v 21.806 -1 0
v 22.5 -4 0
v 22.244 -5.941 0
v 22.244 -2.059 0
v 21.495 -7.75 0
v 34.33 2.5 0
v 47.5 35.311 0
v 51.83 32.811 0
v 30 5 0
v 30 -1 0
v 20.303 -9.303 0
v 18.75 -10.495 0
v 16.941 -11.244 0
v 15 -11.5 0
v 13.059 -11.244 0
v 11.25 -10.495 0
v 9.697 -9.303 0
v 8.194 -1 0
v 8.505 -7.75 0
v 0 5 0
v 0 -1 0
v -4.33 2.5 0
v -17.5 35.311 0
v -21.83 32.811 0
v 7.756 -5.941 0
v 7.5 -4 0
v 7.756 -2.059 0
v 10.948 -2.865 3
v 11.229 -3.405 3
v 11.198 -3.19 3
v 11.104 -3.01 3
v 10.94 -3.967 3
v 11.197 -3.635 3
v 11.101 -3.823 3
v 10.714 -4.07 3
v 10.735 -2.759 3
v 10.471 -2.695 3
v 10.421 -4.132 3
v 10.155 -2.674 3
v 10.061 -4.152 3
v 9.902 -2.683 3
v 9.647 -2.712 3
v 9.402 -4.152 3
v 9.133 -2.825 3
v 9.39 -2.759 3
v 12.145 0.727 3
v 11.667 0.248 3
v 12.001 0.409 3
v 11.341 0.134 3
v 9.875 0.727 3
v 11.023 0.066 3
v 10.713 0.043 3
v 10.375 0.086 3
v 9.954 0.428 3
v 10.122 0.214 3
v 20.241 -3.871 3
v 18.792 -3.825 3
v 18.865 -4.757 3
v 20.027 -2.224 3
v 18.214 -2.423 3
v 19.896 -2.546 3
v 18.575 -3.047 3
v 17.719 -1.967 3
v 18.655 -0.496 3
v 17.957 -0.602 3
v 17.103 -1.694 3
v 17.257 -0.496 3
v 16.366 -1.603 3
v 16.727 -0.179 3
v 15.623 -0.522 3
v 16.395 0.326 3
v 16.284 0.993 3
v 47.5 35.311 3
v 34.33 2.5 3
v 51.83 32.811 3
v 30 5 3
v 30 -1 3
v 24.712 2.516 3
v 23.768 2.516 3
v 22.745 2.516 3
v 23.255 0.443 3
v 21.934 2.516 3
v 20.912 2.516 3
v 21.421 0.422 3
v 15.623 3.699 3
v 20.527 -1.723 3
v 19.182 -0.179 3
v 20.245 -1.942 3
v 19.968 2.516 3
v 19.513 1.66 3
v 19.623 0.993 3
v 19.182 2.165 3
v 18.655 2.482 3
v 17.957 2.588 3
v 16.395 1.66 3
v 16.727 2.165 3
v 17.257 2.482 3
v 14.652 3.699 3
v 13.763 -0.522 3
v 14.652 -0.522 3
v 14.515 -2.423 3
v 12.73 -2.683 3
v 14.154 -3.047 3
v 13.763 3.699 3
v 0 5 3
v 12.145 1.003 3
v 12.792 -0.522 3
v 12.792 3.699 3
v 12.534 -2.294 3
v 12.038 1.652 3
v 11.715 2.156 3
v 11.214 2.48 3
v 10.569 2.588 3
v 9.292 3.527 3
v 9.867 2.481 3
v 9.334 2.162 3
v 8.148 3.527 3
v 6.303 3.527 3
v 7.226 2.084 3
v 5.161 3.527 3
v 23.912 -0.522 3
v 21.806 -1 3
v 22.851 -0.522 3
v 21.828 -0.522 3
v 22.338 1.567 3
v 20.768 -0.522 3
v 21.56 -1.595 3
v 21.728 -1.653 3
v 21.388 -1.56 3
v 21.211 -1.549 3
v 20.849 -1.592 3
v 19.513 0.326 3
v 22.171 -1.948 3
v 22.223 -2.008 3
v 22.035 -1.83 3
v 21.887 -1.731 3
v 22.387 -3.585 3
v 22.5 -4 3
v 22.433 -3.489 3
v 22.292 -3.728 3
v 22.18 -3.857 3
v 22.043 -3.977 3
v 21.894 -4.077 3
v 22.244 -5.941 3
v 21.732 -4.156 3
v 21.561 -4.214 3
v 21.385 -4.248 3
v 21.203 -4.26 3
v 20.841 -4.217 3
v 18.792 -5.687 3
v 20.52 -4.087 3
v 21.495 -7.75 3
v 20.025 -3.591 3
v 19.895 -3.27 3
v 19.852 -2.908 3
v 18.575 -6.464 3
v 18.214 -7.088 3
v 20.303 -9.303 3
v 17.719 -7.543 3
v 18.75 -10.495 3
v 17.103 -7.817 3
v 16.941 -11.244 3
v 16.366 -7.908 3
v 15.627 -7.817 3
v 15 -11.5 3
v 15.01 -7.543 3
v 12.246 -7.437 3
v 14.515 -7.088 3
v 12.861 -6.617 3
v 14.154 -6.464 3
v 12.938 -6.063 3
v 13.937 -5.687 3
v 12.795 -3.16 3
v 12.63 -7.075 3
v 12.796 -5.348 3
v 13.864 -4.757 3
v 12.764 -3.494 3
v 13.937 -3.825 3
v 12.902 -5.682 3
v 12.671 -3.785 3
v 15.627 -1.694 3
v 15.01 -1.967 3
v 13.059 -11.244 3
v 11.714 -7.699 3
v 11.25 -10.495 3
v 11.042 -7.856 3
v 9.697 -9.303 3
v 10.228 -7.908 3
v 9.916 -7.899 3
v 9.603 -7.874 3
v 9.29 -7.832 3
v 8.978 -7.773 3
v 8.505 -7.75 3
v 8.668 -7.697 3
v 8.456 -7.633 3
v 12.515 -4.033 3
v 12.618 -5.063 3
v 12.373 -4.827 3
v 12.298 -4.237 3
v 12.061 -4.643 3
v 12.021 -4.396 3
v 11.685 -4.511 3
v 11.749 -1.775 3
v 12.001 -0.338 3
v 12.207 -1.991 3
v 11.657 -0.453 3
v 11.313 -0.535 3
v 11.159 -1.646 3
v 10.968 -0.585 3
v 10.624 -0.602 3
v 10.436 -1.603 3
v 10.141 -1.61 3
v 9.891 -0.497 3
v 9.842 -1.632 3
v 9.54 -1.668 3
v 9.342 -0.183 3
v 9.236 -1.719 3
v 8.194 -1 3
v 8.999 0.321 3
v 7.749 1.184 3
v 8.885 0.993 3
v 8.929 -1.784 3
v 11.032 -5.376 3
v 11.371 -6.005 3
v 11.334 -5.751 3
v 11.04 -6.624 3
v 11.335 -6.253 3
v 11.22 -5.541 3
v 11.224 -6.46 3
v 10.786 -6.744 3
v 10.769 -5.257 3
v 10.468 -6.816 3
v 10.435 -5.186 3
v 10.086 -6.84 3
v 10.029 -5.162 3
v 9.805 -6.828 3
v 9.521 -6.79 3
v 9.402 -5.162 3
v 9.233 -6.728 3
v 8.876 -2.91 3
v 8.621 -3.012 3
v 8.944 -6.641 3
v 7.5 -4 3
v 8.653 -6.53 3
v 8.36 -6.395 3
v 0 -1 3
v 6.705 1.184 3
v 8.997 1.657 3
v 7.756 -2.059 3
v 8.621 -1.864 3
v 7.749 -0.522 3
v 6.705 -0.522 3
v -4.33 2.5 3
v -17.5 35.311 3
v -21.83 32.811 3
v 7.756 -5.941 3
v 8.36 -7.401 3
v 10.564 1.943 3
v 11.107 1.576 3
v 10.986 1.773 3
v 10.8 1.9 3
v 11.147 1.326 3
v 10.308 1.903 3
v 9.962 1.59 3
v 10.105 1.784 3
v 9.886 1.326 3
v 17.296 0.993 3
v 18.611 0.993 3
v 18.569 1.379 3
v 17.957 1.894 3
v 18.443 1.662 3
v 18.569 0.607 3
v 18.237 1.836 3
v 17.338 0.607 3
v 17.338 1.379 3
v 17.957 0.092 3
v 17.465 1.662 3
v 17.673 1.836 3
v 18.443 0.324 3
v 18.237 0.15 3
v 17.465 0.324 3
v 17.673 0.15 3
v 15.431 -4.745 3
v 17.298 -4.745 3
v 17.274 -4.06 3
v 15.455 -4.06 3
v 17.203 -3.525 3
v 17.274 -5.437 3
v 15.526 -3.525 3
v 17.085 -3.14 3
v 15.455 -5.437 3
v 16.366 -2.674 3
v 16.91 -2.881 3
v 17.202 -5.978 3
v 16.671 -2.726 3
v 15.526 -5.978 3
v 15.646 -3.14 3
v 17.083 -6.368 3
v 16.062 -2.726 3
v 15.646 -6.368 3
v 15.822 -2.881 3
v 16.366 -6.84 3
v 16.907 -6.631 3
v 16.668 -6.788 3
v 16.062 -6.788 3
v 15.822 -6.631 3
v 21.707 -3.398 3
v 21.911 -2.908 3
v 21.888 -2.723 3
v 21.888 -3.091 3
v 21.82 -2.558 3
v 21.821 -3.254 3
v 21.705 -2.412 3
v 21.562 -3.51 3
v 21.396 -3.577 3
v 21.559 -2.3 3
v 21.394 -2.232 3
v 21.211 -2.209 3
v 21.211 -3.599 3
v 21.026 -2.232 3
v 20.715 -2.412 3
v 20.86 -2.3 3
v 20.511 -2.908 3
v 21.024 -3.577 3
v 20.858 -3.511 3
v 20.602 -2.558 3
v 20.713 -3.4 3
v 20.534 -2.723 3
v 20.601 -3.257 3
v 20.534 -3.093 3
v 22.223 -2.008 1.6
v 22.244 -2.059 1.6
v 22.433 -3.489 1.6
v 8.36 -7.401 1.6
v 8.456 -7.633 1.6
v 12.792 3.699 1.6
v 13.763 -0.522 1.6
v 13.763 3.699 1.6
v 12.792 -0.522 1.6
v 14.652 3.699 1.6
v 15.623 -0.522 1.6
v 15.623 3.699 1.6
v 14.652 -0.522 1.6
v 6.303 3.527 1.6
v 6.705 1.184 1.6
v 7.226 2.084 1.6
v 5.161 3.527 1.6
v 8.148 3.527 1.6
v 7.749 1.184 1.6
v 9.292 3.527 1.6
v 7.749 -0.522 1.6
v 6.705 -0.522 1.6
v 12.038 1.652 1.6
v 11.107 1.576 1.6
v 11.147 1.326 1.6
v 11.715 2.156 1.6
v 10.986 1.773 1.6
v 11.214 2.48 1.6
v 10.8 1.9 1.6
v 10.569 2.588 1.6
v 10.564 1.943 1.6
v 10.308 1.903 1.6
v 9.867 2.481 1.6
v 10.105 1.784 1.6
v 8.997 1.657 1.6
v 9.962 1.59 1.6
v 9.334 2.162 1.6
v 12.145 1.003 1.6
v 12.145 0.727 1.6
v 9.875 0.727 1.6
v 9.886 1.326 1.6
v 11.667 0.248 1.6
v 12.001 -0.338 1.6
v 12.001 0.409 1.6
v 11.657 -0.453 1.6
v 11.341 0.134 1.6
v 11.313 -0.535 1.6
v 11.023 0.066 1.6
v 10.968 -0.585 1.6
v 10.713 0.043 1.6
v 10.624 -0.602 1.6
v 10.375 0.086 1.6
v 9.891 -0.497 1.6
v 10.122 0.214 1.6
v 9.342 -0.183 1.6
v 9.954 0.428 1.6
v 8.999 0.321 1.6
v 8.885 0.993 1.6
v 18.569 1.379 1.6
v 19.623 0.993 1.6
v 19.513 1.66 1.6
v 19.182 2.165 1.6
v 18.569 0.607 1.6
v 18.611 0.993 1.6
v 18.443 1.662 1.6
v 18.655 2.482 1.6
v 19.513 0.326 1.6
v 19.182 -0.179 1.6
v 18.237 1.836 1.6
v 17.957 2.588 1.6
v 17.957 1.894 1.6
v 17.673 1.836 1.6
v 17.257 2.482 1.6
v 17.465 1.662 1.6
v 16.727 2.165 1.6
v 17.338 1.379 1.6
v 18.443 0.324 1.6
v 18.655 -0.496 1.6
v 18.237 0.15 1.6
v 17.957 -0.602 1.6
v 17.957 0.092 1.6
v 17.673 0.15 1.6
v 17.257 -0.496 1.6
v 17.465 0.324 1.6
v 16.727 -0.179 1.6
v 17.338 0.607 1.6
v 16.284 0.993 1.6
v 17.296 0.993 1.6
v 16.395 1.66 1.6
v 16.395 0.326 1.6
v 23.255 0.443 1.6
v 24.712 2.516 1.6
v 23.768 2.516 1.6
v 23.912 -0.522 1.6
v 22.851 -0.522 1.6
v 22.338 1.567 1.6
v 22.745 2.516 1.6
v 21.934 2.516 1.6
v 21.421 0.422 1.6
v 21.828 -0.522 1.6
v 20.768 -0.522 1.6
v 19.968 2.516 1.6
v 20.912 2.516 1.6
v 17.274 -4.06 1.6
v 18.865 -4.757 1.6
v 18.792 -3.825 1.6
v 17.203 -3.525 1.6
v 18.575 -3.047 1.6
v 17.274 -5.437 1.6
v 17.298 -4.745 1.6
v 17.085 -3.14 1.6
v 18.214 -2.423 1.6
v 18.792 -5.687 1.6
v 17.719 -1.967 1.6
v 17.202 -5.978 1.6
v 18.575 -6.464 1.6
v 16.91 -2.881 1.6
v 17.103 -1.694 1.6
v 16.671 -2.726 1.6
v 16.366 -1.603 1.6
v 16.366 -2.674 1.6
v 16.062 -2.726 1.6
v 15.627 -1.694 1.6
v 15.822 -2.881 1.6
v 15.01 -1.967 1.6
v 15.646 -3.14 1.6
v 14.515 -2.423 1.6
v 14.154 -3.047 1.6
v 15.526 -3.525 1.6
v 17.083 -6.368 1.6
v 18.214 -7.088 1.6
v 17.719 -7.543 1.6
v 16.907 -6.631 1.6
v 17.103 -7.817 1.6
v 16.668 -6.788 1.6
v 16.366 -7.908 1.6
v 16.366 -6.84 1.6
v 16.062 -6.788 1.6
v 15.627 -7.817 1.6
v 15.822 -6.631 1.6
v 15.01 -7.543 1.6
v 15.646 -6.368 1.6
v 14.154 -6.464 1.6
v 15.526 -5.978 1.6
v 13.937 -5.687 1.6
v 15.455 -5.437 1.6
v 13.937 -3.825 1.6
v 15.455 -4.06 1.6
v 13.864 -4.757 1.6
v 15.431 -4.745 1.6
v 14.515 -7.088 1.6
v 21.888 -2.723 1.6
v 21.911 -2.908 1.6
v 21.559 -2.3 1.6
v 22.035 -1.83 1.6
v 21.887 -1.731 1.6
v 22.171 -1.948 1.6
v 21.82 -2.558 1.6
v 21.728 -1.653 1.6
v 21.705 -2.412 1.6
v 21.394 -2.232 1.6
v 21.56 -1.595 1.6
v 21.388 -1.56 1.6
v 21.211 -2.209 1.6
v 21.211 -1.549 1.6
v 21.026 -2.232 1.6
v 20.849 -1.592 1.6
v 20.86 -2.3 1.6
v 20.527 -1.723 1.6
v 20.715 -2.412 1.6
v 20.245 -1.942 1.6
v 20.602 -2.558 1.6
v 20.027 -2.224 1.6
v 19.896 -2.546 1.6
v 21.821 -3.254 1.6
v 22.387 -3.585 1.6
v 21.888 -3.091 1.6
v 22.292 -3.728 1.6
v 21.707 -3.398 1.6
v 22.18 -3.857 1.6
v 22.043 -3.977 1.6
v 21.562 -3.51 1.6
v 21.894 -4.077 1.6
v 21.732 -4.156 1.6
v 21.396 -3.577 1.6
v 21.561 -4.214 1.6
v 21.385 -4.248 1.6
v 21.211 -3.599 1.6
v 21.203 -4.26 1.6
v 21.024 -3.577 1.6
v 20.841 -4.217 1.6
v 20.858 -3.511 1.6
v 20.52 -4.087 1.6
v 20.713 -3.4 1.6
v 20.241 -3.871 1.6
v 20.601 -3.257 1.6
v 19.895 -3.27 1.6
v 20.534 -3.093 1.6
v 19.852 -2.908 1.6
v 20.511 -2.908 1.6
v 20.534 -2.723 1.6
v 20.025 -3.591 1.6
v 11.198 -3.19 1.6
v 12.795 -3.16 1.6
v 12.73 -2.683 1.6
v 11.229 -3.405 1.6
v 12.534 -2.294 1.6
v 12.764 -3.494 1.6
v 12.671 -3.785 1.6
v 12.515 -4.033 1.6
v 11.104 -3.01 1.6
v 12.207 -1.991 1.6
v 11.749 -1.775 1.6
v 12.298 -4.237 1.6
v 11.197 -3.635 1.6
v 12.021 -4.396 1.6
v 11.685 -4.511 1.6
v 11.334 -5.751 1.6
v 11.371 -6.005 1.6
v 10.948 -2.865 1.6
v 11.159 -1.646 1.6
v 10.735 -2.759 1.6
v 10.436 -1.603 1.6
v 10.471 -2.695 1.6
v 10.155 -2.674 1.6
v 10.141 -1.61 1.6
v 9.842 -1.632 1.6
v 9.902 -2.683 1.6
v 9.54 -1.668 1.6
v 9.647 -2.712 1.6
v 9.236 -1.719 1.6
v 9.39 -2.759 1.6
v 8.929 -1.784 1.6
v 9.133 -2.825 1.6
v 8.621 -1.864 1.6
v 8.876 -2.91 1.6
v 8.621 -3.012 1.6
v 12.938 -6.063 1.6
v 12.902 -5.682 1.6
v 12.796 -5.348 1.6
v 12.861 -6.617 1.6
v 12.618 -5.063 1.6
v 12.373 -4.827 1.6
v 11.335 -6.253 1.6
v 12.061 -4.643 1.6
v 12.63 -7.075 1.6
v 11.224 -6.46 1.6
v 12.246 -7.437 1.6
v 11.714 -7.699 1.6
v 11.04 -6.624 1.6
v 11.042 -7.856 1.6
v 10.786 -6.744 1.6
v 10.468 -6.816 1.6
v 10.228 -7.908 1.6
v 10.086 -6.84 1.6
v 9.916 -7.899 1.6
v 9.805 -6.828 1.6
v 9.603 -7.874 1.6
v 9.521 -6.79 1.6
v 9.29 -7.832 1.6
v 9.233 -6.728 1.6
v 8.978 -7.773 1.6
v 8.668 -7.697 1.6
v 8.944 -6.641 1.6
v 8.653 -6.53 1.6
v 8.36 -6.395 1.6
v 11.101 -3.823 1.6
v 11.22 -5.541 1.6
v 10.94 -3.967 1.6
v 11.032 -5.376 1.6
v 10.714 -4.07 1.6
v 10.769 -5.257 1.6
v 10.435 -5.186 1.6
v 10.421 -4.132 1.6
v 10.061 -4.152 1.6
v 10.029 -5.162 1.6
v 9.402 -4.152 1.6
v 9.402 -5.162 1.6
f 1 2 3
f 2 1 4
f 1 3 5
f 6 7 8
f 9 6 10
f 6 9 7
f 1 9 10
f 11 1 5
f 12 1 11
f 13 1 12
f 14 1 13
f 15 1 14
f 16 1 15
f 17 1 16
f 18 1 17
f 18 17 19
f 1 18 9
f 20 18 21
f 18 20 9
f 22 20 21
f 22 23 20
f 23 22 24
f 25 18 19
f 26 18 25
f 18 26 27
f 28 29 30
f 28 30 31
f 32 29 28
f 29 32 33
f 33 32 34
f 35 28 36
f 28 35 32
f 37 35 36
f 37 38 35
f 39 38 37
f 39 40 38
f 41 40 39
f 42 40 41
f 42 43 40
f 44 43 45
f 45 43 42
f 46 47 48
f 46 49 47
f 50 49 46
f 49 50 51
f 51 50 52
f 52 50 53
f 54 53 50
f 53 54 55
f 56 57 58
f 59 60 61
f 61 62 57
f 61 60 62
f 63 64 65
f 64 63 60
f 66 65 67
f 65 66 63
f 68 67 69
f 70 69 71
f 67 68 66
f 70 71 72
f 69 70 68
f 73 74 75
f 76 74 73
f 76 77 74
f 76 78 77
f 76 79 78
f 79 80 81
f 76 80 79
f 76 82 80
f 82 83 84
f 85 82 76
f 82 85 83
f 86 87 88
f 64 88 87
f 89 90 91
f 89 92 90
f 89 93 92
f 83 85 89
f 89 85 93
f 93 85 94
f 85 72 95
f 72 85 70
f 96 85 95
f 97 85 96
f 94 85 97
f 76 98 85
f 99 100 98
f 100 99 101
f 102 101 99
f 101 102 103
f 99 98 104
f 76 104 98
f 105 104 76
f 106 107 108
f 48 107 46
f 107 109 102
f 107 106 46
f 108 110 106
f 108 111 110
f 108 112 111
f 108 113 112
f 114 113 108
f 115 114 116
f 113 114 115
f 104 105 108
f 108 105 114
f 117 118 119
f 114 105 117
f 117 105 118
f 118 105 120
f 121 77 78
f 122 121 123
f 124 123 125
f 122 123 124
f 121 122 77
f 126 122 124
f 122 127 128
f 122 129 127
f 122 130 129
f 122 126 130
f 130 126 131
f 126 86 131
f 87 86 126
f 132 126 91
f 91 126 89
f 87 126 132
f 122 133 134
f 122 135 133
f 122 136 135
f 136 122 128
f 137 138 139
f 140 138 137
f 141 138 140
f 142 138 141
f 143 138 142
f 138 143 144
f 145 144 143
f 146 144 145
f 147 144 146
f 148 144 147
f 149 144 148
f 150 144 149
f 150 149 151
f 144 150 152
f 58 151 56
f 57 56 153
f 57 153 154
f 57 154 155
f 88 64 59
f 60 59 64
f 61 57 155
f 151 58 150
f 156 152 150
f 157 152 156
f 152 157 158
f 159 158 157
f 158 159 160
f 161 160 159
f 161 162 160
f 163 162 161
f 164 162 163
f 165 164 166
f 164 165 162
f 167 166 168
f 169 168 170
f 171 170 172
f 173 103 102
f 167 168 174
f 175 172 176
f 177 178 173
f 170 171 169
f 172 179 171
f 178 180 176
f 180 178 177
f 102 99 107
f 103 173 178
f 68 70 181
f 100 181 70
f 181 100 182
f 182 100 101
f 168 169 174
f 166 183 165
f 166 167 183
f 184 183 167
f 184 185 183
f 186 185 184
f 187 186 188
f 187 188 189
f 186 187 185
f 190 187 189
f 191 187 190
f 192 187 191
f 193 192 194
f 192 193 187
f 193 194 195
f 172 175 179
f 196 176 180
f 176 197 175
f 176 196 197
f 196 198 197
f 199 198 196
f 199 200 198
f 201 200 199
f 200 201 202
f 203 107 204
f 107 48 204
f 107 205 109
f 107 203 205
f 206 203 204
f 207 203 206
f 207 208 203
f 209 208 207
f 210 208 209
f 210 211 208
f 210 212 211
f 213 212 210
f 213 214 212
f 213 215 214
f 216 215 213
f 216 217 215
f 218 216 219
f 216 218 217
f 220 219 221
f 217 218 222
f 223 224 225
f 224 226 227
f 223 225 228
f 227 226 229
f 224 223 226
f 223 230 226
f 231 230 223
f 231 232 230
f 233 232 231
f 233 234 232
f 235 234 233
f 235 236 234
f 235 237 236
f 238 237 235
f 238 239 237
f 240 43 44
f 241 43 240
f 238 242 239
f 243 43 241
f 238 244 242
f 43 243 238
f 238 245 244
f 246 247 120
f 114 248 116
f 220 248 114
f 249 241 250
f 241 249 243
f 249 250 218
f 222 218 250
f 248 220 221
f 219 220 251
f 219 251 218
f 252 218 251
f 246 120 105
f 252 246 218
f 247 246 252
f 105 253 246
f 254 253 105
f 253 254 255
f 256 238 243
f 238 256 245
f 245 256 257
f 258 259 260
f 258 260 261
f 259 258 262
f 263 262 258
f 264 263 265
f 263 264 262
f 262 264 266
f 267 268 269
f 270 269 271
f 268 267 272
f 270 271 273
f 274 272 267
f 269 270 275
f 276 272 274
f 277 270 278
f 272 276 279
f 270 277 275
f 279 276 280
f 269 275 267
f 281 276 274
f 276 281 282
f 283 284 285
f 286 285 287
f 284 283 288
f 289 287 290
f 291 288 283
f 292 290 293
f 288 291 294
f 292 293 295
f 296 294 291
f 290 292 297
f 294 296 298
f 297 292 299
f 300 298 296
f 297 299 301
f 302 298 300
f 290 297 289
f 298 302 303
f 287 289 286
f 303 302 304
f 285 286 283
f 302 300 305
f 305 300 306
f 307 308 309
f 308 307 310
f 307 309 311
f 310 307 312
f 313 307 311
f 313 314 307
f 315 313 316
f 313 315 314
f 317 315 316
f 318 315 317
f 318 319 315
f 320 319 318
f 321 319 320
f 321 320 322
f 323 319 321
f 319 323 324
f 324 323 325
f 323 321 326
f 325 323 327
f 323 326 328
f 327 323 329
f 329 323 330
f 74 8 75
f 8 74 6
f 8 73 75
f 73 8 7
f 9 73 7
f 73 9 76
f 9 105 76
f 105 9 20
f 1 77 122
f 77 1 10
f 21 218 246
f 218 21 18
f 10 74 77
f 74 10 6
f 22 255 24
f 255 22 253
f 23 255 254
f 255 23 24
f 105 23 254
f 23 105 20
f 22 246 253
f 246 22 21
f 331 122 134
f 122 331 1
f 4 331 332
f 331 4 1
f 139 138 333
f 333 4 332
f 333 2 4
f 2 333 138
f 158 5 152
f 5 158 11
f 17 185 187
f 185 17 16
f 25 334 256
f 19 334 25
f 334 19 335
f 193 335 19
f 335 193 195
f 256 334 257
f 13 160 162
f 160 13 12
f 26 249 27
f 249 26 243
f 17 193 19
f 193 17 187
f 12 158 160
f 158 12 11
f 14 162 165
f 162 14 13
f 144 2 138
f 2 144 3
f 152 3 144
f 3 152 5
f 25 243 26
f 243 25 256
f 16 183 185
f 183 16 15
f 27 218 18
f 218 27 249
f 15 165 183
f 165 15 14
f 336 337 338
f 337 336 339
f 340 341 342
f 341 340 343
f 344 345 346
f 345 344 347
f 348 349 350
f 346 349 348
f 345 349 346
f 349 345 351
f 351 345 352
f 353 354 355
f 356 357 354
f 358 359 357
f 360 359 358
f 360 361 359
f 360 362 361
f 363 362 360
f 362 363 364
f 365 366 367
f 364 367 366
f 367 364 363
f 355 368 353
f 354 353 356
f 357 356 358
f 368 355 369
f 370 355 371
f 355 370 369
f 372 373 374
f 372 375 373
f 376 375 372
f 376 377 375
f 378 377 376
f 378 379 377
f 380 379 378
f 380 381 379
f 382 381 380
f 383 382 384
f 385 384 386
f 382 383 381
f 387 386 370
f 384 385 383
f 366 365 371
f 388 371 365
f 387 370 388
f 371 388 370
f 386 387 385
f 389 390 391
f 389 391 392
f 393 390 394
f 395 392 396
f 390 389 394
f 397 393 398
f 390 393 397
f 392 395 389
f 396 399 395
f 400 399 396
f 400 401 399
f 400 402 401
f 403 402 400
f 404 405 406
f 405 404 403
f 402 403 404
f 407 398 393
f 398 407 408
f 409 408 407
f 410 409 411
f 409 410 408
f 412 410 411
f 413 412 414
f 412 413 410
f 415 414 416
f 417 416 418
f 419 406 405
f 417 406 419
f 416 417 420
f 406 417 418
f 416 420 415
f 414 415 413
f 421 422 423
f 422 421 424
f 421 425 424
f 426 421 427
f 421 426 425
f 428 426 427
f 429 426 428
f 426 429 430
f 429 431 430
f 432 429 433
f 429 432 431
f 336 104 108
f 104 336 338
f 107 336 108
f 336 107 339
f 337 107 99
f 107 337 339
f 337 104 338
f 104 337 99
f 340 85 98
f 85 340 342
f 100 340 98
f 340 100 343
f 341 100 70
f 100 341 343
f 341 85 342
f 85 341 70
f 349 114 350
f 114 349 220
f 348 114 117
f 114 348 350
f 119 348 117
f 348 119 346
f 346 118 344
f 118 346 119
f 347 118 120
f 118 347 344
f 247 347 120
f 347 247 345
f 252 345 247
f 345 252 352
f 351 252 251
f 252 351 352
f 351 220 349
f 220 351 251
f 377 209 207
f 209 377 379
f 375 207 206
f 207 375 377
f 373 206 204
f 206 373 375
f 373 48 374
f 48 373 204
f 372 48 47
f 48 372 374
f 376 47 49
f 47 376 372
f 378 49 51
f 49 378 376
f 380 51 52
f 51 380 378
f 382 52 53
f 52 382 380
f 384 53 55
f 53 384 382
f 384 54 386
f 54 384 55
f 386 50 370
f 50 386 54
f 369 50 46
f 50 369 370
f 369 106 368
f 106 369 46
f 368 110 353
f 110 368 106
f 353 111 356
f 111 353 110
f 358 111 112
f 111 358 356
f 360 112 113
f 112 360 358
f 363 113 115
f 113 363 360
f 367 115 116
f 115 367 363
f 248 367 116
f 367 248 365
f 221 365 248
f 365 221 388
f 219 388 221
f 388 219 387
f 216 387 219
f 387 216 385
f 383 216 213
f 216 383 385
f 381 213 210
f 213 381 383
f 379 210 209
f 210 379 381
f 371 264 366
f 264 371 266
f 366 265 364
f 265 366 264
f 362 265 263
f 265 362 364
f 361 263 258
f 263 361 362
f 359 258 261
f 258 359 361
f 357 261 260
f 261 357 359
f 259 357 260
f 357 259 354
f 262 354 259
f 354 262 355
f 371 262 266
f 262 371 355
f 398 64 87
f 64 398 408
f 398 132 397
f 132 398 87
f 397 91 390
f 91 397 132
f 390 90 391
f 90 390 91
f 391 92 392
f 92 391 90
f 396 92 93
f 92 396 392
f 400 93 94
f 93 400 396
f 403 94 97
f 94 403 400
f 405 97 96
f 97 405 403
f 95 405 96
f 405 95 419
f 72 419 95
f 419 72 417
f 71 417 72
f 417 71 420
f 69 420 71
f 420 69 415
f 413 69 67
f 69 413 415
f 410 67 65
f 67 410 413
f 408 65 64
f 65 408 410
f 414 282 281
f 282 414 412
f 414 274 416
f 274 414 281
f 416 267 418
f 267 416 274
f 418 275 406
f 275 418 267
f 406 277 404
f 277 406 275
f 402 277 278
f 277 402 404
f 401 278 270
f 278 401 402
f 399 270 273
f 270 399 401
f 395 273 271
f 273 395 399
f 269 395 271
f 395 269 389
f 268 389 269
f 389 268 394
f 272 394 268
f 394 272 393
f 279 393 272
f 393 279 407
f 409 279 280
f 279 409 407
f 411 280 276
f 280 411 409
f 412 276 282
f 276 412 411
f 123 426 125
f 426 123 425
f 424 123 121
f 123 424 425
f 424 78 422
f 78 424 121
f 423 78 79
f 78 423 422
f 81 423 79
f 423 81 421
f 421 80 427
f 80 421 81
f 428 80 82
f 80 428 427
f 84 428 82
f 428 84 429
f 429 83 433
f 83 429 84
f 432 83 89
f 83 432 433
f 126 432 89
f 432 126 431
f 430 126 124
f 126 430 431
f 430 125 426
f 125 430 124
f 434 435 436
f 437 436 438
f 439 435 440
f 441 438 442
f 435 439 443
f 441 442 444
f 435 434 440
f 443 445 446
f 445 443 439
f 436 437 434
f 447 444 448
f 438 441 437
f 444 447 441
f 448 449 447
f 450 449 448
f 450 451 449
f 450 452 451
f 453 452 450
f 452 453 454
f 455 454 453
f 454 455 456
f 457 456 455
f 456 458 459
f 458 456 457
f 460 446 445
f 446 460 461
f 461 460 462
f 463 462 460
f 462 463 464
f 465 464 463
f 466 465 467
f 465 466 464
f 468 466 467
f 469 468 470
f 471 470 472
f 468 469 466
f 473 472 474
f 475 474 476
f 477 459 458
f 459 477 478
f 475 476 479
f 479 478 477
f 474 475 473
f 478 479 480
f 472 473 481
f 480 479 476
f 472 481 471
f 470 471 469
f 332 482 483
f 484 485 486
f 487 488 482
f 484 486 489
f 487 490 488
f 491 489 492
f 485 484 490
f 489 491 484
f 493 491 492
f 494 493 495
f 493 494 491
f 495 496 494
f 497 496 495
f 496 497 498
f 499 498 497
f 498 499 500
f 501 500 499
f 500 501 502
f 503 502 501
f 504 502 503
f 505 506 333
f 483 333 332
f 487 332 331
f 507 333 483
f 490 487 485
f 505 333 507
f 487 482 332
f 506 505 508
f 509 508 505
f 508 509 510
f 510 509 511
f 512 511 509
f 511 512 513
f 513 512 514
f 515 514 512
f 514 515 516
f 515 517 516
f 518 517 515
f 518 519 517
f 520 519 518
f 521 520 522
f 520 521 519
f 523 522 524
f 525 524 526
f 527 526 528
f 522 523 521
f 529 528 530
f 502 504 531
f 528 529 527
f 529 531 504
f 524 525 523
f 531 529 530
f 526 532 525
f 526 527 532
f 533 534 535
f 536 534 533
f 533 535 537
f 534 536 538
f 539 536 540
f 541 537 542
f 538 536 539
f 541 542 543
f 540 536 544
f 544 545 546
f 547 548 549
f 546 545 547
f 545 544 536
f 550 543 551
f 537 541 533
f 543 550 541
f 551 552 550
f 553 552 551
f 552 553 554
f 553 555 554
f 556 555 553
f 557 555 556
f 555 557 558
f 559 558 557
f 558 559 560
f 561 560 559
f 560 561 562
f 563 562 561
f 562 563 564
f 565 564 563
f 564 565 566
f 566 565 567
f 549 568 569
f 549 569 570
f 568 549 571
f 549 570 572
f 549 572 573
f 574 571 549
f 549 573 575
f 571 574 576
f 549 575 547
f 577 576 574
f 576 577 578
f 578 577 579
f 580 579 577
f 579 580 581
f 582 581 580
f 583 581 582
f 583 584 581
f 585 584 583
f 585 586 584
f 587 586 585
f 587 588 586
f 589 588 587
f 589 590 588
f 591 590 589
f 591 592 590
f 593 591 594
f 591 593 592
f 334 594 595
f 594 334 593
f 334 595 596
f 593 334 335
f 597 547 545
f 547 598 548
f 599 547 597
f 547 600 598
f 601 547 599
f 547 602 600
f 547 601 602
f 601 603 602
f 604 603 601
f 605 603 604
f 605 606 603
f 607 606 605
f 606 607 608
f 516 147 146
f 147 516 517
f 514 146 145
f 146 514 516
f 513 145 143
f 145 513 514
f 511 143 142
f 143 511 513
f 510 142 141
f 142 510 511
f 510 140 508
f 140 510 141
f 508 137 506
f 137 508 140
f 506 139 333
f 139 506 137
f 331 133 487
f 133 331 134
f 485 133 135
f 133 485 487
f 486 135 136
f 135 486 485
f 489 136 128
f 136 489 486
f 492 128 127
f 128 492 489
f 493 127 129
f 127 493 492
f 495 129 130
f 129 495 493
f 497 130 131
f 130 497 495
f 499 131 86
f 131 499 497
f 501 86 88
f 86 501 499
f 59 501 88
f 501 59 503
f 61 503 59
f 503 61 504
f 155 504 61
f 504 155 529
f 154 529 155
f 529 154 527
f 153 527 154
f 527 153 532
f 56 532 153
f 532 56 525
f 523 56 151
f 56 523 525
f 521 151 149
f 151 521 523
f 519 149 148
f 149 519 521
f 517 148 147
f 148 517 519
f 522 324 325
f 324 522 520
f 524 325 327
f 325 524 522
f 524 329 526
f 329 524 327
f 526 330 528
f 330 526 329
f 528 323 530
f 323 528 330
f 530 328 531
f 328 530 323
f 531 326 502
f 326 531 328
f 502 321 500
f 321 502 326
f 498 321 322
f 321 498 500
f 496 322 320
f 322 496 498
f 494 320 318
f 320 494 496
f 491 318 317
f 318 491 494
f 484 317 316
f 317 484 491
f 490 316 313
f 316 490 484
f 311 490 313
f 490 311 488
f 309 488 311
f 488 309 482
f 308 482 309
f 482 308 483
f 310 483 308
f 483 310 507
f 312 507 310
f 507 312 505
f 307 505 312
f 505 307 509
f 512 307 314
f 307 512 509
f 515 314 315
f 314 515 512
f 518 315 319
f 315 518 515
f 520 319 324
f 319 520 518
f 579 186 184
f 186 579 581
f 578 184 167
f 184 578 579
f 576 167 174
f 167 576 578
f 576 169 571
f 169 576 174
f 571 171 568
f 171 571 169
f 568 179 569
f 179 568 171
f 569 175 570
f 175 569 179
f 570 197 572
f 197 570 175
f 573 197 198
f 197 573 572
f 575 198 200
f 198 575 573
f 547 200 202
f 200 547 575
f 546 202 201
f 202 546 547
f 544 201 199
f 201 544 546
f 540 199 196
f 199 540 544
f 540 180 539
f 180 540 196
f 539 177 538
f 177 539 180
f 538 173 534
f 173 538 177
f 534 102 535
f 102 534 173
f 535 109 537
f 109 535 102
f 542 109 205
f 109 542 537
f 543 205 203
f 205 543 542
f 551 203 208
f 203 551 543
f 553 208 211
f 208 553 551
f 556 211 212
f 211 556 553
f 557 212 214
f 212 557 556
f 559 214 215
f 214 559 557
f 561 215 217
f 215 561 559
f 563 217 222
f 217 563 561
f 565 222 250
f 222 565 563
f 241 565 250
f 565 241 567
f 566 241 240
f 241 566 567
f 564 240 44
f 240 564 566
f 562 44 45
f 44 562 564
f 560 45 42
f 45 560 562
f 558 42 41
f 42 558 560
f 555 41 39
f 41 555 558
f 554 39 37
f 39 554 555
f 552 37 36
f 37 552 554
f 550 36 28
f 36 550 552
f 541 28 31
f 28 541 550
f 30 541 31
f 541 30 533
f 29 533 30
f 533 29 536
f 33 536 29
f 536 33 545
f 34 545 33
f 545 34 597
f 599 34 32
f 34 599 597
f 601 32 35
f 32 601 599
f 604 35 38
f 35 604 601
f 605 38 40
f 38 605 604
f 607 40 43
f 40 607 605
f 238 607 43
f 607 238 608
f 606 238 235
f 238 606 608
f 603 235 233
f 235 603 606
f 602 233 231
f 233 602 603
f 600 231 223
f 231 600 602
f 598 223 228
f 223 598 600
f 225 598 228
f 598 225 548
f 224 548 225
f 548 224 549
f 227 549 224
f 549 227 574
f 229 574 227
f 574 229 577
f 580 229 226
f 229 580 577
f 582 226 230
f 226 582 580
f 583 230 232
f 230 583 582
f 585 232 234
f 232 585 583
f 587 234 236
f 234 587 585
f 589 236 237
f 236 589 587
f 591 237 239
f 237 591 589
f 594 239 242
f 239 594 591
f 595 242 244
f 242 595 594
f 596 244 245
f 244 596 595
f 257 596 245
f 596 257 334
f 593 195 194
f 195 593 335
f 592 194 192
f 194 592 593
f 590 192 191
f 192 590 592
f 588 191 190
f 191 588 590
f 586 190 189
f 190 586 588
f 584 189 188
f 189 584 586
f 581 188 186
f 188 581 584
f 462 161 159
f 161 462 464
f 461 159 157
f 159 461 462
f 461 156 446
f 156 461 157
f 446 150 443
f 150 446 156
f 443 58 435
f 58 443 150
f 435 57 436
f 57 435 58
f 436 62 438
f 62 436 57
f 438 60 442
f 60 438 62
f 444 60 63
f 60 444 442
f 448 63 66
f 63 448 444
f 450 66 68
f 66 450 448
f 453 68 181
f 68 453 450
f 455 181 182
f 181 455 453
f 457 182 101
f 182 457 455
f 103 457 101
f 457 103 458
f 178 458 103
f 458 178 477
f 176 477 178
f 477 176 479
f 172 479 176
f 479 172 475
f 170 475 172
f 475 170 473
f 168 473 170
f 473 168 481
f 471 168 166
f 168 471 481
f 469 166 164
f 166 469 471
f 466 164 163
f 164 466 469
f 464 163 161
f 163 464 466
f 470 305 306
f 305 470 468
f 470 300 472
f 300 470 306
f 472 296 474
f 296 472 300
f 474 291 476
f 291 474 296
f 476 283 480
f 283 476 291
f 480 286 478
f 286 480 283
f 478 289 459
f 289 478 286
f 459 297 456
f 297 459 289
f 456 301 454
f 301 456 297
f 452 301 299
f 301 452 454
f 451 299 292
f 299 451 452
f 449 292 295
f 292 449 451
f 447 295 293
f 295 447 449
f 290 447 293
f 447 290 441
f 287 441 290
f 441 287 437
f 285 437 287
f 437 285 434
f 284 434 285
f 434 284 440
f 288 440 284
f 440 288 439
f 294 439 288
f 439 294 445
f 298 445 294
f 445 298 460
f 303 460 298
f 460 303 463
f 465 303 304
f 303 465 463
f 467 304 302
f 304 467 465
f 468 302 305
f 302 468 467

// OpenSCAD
// Armada 30 degree turn template

turnAngle = 30.00 ;

baseWidth=30.00 ; height=3.00 ;
armLength = 35.00;
baseDepth = 5.00 ;

points = [[0,baseDepth],[baseWidth,baseDepth]
         ,[baseWidth+armLength*sin(turnAngle), baseDepth+armLength*cos(turnAngle)]
         ,[baseWidth+armLength*sin(turnAngle)+baseDepth*cos(turnAngle), baseDepth+armLength*cos(turnAngle) - baseDepth*sin(turnAngle) ]
         ,[baseWidth+baseDepth*cos(turnAngle), baseDepth - baseDepth*sin(turnAngle) ]
         ,[baseWidth,-1.00], [0,-1.00]
] ;

difference() 
    {
     union() 
     {
         linear_extrude(height=height) polygon(points);
         translate([baseWidth,0,0])mirror([1,0,0])linear_extrude(height=height) polygon(points);
         // add finger tab
         translate([baseWidth/2,-4,0]) color("orange") cylinder(r=7.5,h=height) ;
     }

     translate([baseWidth/2,baseDepth/2-1,1.6])
         linear_extrude(height=2.0)
            text("Yellow", font="Arial Nova:style=Bold",size=4, valign="center", halign="center");

     translate([baseWidth/2+.5,-4.8,1.6])
         linear_extrude(height=1.5)
            text("30°", size=6, font="Arial Nova:style=Bold", valign="center", halign="center");
}
